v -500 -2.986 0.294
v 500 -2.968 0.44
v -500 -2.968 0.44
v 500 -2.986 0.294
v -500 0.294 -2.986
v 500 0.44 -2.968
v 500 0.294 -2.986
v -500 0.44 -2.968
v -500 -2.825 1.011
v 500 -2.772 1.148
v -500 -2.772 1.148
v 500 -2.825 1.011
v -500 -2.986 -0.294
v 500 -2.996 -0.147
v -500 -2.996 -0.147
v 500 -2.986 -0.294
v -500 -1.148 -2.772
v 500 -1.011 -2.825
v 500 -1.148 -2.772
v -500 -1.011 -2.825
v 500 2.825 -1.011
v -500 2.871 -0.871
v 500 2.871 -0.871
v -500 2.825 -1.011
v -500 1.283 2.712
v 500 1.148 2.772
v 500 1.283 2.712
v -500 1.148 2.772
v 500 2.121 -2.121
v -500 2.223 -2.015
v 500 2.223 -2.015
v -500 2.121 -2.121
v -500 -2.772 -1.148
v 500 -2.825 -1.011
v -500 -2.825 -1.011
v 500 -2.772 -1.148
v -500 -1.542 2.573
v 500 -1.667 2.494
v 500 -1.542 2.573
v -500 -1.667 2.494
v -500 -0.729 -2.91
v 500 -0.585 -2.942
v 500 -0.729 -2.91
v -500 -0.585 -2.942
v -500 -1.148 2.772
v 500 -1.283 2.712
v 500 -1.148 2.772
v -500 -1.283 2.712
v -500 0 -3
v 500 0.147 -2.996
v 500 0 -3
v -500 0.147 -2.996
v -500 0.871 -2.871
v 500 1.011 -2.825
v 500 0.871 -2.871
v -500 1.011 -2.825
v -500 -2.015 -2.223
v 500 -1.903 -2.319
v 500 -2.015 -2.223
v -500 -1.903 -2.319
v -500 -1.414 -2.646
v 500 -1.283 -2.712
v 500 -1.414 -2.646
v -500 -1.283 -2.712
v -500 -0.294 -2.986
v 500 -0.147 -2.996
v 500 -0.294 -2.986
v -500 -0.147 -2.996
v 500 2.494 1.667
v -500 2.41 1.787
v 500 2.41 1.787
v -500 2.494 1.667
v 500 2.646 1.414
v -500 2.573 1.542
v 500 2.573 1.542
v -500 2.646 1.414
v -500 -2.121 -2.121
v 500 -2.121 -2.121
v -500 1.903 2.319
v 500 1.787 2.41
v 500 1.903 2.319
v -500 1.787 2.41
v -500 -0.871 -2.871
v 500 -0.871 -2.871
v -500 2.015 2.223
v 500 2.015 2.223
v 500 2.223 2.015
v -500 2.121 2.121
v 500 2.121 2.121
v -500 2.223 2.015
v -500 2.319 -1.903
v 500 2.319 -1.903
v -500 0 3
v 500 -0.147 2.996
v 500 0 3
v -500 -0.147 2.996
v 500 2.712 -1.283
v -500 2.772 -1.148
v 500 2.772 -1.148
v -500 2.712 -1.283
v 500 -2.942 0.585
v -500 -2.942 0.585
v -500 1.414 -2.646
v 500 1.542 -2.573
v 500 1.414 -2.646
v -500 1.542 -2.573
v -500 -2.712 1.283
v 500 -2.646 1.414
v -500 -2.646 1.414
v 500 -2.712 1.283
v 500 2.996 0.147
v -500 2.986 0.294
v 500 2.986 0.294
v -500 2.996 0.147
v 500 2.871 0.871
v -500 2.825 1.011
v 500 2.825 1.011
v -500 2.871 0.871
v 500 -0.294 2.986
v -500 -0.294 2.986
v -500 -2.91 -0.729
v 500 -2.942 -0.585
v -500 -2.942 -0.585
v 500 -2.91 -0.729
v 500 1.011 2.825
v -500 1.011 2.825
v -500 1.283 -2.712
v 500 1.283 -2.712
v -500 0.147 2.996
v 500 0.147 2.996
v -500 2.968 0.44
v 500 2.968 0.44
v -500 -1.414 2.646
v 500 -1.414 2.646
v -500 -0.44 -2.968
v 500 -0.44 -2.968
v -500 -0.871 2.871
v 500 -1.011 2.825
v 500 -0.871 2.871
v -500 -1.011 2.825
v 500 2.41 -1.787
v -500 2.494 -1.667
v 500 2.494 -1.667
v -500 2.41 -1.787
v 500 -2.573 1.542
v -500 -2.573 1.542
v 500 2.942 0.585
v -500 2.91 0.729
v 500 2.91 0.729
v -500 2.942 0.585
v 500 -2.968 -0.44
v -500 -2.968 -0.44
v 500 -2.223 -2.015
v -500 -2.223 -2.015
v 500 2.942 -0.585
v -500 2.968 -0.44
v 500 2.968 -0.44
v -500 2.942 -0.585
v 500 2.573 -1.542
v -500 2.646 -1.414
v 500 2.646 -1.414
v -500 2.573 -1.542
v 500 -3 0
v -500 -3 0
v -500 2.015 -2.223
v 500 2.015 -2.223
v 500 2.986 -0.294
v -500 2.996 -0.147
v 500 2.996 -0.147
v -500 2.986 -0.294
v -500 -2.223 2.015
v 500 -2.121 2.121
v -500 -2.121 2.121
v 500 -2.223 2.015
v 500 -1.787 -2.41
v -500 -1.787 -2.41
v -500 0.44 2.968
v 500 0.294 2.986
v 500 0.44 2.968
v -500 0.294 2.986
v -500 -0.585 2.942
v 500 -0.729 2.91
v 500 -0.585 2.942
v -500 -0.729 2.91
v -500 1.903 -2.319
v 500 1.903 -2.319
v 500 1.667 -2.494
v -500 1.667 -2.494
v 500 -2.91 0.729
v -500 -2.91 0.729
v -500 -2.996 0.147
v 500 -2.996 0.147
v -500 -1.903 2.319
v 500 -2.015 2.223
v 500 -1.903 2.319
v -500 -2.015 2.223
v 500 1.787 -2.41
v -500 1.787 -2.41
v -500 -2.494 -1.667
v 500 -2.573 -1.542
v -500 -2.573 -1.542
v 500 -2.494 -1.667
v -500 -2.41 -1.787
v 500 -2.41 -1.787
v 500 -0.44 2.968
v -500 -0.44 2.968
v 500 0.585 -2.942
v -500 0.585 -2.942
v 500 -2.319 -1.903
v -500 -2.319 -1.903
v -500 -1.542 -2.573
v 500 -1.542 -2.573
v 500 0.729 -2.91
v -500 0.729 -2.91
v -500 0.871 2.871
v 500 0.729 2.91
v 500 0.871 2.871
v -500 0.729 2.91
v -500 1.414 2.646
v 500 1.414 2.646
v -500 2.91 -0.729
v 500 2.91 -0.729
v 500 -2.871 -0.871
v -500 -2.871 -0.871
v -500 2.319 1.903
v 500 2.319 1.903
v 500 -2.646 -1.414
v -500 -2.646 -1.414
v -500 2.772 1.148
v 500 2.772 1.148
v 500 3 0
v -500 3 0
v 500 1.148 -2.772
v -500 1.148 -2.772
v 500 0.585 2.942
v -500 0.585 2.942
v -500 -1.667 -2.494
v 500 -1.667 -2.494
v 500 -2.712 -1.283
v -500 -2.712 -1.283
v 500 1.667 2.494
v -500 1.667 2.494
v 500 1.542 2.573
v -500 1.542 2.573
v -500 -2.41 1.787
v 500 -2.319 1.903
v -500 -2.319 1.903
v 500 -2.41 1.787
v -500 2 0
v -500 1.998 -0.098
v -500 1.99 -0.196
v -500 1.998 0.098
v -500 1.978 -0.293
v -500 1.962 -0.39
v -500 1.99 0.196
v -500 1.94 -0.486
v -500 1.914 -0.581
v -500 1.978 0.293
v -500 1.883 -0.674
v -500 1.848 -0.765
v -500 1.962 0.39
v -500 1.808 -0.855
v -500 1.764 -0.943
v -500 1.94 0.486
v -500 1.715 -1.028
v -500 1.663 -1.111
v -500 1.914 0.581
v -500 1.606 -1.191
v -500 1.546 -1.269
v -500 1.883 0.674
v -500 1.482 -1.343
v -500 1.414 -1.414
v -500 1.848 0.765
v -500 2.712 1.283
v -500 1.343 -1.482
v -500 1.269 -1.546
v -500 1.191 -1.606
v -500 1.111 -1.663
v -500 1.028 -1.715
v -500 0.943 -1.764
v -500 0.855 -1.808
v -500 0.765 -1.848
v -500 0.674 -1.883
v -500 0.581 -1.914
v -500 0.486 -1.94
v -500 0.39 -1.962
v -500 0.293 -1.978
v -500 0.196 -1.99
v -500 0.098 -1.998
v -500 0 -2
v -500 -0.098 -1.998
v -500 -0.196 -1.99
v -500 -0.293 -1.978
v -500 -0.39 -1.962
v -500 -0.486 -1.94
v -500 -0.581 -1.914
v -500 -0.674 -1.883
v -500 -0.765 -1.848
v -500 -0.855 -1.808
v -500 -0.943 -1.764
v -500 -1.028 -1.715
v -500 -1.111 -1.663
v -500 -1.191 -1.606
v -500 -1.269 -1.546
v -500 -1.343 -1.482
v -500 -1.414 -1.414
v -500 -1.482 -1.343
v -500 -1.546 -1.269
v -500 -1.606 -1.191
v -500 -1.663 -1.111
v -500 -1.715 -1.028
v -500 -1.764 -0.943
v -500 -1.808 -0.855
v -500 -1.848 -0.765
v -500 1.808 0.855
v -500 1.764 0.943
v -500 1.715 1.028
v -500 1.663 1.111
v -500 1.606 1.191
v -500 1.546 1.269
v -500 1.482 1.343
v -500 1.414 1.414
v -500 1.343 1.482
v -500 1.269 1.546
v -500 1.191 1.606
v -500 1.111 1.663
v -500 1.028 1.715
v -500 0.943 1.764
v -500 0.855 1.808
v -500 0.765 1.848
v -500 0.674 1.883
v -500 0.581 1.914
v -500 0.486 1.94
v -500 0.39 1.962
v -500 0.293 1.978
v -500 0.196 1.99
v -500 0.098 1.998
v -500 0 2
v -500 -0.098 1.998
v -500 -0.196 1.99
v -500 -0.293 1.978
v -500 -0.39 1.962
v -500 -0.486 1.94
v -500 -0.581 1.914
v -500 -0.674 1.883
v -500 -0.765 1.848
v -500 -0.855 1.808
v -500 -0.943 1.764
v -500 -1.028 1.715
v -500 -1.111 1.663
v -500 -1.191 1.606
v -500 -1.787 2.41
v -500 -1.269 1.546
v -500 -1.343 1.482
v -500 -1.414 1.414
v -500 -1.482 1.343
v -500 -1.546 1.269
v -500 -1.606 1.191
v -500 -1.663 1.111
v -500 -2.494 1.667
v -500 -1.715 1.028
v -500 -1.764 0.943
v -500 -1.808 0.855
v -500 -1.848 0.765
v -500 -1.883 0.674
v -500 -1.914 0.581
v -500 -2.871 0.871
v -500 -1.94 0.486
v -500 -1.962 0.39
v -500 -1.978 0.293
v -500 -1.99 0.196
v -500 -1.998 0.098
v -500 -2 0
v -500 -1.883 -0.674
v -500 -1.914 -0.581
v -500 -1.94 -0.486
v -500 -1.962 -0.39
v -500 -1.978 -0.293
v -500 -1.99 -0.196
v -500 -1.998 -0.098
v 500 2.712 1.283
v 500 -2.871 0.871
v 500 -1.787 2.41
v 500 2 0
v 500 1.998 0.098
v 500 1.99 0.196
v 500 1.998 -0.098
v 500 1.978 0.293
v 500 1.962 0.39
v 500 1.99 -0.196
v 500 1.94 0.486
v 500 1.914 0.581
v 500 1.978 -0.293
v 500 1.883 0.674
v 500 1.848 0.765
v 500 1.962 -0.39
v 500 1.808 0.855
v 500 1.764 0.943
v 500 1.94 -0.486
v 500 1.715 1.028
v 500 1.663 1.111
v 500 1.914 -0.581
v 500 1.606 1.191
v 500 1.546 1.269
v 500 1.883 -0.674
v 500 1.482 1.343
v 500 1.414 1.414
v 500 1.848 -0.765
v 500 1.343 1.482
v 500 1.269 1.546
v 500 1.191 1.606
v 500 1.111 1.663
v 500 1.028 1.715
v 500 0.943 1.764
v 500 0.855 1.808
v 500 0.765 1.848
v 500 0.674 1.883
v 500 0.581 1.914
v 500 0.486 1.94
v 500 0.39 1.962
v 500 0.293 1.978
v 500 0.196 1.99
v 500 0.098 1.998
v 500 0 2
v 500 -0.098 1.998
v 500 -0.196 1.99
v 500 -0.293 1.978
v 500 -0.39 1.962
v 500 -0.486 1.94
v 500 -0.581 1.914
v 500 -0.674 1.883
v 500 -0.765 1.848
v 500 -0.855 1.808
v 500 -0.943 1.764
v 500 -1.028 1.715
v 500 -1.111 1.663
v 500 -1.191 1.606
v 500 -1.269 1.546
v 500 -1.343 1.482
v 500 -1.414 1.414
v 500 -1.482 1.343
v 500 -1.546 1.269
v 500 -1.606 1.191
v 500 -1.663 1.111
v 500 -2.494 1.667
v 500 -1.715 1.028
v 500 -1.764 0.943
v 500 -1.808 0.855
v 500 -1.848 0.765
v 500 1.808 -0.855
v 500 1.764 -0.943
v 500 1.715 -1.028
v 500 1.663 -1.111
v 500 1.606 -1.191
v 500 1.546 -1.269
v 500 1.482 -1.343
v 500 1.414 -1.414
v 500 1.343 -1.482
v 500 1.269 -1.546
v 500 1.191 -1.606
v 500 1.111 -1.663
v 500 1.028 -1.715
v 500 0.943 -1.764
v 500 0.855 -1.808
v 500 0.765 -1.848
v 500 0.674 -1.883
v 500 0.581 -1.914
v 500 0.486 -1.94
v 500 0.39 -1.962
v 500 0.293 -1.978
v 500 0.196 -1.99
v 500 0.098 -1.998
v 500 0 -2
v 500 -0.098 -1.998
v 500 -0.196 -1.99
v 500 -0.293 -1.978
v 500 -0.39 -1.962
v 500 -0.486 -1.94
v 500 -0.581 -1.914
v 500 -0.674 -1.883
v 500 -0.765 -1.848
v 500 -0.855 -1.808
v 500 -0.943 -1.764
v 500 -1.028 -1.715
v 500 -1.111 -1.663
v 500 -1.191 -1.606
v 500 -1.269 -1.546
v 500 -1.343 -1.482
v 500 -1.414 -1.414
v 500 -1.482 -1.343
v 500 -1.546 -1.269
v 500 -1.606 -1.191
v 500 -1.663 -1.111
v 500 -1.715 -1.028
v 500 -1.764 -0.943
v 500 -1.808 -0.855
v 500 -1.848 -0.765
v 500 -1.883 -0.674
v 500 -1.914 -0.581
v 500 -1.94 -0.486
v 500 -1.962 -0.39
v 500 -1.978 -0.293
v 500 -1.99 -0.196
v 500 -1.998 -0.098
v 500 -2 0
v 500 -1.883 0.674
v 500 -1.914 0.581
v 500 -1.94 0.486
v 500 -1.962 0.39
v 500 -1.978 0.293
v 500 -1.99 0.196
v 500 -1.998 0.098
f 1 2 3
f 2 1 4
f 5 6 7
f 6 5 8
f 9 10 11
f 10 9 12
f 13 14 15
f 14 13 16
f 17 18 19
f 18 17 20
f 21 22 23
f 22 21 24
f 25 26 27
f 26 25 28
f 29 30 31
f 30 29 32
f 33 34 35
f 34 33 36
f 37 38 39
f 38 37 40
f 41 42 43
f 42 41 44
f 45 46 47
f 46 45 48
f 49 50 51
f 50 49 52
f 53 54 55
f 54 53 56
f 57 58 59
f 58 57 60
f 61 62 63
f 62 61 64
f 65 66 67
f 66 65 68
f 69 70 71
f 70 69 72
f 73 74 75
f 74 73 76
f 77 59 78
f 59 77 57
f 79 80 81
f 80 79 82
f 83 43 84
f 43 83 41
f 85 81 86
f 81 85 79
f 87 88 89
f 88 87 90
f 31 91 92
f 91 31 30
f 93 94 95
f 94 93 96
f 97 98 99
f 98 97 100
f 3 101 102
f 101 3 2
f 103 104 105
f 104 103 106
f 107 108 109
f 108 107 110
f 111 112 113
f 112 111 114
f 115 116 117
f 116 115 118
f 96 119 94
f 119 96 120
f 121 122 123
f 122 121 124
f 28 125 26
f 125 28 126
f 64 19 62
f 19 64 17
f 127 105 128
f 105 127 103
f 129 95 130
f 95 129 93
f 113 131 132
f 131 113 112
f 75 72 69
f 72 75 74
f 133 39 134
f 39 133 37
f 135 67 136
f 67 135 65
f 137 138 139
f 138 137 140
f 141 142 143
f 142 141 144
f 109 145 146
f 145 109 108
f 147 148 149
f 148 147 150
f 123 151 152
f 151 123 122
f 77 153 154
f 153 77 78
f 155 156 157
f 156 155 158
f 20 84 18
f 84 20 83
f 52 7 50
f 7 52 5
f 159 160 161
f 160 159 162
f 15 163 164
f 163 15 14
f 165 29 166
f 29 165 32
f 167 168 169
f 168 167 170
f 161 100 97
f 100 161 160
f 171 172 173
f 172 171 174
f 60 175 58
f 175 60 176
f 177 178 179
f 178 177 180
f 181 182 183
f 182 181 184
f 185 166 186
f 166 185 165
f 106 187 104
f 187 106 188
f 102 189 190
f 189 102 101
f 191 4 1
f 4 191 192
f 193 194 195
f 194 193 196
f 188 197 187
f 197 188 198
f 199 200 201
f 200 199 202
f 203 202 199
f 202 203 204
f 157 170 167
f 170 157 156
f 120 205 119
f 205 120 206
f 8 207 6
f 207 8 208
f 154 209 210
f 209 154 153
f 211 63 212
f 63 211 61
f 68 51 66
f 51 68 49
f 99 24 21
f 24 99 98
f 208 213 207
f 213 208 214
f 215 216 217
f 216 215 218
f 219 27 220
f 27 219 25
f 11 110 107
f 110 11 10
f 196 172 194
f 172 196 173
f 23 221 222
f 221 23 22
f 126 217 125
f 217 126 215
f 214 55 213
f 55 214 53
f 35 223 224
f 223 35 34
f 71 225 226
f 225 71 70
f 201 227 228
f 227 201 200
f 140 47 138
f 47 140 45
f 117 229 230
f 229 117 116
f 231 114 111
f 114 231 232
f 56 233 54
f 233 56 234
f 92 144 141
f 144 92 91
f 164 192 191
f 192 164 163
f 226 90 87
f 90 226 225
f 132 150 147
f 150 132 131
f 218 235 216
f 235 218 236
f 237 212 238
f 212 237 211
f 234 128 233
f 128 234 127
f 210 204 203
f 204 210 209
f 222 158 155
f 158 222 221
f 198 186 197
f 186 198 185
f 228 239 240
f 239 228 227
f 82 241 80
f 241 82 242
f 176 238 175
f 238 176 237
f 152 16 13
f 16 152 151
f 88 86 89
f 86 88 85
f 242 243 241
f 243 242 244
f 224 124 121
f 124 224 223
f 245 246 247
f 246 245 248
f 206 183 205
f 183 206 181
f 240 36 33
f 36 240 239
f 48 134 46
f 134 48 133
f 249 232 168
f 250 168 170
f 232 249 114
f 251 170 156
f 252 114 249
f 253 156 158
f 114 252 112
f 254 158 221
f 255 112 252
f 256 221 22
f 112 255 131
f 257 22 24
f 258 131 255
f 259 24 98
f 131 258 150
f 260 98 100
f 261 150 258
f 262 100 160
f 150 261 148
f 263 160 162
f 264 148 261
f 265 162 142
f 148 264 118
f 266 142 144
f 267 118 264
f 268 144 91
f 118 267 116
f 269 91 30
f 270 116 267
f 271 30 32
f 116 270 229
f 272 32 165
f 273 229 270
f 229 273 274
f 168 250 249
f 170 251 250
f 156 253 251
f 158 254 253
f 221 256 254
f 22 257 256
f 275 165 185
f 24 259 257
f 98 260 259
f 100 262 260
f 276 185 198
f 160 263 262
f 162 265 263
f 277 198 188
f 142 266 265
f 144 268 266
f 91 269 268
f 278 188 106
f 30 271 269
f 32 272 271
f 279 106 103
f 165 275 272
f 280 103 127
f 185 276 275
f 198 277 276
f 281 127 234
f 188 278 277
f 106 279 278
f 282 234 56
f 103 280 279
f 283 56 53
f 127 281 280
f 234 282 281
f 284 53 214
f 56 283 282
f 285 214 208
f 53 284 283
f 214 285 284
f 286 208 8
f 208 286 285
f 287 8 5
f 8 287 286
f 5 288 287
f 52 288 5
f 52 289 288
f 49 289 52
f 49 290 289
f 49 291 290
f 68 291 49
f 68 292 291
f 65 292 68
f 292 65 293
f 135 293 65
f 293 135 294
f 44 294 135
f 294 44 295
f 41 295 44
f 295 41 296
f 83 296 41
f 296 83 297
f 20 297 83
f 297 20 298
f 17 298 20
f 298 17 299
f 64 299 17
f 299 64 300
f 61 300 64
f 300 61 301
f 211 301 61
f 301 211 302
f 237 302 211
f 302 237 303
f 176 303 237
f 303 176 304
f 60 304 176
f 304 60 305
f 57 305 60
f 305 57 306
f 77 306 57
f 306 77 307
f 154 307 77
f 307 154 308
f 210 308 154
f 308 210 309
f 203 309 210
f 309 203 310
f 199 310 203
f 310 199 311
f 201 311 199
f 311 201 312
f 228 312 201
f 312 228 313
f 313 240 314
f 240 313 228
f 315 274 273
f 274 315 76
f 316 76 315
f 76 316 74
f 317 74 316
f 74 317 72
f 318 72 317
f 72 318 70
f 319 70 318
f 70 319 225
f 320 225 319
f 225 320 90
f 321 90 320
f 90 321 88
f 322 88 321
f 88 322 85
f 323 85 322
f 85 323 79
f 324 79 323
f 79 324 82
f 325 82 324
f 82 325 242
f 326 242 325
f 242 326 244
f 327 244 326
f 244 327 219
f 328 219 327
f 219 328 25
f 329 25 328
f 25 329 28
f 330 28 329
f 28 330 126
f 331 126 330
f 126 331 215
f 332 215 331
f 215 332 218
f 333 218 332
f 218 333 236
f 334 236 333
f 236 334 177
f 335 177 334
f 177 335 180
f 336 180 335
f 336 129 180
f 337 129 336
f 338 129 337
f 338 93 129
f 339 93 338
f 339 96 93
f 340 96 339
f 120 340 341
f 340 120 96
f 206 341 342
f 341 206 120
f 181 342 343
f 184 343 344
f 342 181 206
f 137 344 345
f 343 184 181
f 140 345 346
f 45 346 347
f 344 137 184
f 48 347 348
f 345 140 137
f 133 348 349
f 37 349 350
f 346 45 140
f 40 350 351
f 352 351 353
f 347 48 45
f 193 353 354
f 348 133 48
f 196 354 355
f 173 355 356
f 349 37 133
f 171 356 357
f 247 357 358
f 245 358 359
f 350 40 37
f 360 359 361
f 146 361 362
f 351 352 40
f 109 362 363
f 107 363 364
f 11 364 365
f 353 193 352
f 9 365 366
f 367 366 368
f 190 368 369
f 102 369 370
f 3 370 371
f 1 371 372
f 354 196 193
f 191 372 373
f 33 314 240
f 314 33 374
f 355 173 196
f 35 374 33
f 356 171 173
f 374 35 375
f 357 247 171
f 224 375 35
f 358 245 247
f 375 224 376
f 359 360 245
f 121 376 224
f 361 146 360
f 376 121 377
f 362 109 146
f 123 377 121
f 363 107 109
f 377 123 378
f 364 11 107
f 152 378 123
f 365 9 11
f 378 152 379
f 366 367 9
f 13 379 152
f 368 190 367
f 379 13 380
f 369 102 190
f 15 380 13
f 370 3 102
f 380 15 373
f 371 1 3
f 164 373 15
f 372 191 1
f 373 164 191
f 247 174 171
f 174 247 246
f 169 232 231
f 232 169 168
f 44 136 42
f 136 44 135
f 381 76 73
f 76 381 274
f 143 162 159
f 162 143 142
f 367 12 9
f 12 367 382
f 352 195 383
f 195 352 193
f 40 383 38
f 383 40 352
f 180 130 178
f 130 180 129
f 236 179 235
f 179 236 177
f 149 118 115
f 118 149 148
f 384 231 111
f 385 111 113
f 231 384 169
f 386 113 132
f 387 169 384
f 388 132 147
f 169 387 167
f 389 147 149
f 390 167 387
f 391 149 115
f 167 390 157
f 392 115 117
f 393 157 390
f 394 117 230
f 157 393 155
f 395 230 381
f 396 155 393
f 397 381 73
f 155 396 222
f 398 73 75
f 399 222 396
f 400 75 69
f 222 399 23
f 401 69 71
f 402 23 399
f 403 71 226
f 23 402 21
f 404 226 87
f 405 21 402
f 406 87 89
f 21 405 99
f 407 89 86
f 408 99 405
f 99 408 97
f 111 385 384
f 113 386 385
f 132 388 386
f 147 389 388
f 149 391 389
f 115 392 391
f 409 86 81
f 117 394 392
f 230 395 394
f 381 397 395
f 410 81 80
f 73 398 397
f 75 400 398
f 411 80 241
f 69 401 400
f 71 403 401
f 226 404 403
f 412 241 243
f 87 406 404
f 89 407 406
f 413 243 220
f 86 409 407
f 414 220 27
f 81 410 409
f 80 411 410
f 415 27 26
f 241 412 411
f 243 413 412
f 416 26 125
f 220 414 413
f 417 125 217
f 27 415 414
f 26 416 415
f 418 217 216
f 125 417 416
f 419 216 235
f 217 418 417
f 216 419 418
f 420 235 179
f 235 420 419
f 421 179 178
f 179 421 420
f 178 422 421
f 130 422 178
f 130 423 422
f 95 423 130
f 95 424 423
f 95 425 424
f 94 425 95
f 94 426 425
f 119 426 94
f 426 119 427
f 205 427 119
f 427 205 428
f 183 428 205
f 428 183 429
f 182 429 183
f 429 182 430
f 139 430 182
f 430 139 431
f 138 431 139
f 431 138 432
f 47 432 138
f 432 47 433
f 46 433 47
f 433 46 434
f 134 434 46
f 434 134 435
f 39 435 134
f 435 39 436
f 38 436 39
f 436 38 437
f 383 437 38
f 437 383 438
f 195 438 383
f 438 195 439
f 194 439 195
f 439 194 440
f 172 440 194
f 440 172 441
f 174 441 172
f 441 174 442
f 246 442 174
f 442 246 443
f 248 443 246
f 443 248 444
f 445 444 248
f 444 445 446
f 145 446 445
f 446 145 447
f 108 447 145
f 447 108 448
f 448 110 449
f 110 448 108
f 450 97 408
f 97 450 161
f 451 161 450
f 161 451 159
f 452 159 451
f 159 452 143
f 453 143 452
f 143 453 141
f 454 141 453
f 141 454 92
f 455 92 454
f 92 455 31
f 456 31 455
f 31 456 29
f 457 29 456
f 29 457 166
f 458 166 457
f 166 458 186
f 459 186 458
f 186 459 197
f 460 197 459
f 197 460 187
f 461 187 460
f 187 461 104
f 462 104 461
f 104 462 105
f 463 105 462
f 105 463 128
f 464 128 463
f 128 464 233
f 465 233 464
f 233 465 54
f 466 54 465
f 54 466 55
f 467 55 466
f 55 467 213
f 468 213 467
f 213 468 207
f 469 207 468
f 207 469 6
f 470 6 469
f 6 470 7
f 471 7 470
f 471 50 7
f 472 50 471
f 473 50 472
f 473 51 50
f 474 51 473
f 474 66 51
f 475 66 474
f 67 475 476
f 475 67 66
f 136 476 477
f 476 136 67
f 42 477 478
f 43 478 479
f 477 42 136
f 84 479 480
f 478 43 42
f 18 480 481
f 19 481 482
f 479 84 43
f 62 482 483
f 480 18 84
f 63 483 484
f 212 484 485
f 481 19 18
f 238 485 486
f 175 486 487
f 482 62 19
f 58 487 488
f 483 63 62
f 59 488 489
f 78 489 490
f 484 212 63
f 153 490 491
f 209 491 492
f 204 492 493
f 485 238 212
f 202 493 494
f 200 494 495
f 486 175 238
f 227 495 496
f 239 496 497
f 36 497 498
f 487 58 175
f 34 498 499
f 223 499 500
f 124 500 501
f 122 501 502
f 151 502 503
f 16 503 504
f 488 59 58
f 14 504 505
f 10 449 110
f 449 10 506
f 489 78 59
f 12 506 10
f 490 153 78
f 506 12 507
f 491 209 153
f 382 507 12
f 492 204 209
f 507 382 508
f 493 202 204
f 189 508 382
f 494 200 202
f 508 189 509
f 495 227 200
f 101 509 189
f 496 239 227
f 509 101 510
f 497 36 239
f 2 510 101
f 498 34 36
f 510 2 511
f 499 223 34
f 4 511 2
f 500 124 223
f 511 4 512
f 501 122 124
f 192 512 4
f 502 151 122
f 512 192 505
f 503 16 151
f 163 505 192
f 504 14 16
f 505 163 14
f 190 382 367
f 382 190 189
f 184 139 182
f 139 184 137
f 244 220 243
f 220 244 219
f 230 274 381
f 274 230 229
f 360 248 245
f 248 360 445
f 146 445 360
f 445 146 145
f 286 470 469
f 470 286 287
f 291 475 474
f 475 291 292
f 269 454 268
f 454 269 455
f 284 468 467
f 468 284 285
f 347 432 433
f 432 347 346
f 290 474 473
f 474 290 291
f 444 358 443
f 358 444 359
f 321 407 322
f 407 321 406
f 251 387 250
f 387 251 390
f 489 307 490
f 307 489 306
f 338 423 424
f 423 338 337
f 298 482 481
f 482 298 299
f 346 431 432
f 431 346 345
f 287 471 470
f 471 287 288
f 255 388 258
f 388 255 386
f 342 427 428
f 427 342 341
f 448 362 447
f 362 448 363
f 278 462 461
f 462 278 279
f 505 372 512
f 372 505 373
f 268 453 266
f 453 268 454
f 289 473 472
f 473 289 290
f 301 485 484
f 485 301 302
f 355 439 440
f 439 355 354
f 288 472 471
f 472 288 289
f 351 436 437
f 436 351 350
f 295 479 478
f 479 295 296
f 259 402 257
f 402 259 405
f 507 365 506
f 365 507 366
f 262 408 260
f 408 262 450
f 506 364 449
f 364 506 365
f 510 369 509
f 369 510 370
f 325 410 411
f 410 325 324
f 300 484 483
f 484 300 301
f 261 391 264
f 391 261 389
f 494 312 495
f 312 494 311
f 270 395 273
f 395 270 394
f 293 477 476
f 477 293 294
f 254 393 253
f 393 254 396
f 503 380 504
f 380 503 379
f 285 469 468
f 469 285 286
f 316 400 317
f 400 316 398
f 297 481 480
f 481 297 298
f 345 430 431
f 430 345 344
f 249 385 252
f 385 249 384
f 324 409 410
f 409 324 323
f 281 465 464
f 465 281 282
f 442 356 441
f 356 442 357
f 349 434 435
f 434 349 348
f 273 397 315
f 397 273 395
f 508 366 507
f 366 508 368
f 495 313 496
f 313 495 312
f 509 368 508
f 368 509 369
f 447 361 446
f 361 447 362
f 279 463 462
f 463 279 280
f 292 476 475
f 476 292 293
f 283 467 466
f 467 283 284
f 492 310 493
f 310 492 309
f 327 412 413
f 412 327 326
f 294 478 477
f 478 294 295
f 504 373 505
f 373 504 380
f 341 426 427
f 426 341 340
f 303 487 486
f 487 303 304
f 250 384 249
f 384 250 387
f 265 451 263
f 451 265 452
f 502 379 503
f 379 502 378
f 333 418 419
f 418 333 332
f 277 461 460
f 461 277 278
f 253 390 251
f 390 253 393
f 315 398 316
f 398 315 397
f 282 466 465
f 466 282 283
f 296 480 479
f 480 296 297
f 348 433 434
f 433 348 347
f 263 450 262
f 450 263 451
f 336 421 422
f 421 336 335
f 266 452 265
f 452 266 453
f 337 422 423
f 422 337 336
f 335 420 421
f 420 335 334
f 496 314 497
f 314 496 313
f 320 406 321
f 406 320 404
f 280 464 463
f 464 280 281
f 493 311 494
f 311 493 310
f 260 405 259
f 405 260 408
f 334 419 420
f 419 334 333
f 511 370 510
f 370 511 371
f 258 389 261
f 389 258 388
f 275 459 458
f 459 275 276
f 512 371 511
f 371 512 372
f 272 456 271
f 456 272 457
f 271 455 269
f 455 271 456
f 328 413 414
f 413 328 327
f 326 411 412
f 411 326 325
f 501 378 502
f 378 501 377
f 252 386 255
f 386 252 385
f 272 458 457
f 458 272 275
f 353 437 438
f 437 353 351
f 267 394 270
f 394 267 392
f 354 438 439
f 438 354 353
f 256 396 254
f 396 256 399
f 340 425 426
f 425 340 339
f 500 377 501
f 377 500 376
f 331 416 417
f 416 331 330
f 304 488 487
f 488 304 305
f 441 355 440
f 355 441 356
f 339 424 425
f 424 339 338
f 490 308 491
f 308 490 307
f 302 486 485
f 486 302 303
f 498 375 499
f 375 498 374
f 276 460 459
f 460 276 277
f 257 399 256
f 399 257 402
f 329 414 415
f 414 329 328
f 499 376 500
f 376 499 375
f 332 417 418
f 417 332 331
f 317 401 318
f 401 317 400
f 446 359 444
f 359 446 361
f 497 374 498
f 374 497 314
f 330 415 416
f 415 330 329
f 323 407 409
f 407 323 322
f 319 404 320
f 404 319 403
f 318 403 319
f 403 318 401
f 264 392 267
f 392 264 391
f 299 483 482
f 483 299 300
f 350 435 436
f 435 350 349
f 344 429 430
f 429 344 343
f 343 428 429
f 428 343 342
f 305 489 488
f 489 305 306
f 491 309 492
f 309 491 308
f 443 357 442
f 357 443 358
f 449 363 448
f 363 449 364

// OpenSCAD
// PVC aquarium tubing (hollow tube)
// Fix: ensure non-zero wall thickness and avoid self-canceling geometry.
// Also orient tube along X so orthographic views show a recognizable long tube.

$fn = 128;

// Parameters
tube_length     = 1000; //[500:2000:10]
outer_diameter  = 6;    //[3:12:0.5]
inner_diameter  = 4;    //[2:10:0.5]
wall_thickness  = 1;    //[0.5:3:0.1]  // fallback if inner_diameter invalid
end_face_square = 1;    //[0:1:1]      // 1 = square ends, 0 = chamfered ends
chamfer_length  = 1;    //[0.5:5:0.1]
chamfer_radial  = 0.5;  //[0.2:2:0.1]
bore_overlap    = 2;    //[0.5:10:0.5]
eps             = 0.02;

// Derived (robust radii)
outer_r = max(0.05, outer_diameter/2);
inner_r_limit = max(0.01, outer_r - max(0.05, wall_thickness));
inner_r_raw   = inner_diameter/2;
inner_r       = (inner_r_raw > 0 && inner_r_raw < inner_r_limit) ? inner_r_raw : inner_r_limit;

// Chamfer cutter placed at an end (along X axis)
module end_chamfer_cutter(sign=1) {
  // sign = +1 for +X end, -1 for -X end
  translate([sign*(tube_length/2 - chamfer_length/2), 0, 0])
    rotate([0, 90, 0])  // make cylinder axis along X
      cylinder(
        h  = chamfer_length + 2*eps,
        r1 = outer_r + chamfer_radial,
        r2 = max(0.01, outer_r - chamfer_radial),
        center = true
      );
}

// Final tube (ONE connected solid)
module pvc_tube() {
  difference() {
    // Outer body (optionally chamfered)
    difference() {
      rotate([0, 90, 0]) cylinder(h=tube_length, r=outer_r, center=true); // axis along X
      if (end_face_square == 0) {
        end_chamfer_cutter(+1);
        mirror([1,0,0]) end_chamfer_cutter(+1);
      }
    }

    // Inner bore (slightly longer for clean subtraction)
    rotate([0, 90, 0]) cylinder(h=tube_length + 2*bore_overlap, r=inner_r, center=true);
  }
}

color([0.85, 0.85, 0.8]) pvc_tube();
